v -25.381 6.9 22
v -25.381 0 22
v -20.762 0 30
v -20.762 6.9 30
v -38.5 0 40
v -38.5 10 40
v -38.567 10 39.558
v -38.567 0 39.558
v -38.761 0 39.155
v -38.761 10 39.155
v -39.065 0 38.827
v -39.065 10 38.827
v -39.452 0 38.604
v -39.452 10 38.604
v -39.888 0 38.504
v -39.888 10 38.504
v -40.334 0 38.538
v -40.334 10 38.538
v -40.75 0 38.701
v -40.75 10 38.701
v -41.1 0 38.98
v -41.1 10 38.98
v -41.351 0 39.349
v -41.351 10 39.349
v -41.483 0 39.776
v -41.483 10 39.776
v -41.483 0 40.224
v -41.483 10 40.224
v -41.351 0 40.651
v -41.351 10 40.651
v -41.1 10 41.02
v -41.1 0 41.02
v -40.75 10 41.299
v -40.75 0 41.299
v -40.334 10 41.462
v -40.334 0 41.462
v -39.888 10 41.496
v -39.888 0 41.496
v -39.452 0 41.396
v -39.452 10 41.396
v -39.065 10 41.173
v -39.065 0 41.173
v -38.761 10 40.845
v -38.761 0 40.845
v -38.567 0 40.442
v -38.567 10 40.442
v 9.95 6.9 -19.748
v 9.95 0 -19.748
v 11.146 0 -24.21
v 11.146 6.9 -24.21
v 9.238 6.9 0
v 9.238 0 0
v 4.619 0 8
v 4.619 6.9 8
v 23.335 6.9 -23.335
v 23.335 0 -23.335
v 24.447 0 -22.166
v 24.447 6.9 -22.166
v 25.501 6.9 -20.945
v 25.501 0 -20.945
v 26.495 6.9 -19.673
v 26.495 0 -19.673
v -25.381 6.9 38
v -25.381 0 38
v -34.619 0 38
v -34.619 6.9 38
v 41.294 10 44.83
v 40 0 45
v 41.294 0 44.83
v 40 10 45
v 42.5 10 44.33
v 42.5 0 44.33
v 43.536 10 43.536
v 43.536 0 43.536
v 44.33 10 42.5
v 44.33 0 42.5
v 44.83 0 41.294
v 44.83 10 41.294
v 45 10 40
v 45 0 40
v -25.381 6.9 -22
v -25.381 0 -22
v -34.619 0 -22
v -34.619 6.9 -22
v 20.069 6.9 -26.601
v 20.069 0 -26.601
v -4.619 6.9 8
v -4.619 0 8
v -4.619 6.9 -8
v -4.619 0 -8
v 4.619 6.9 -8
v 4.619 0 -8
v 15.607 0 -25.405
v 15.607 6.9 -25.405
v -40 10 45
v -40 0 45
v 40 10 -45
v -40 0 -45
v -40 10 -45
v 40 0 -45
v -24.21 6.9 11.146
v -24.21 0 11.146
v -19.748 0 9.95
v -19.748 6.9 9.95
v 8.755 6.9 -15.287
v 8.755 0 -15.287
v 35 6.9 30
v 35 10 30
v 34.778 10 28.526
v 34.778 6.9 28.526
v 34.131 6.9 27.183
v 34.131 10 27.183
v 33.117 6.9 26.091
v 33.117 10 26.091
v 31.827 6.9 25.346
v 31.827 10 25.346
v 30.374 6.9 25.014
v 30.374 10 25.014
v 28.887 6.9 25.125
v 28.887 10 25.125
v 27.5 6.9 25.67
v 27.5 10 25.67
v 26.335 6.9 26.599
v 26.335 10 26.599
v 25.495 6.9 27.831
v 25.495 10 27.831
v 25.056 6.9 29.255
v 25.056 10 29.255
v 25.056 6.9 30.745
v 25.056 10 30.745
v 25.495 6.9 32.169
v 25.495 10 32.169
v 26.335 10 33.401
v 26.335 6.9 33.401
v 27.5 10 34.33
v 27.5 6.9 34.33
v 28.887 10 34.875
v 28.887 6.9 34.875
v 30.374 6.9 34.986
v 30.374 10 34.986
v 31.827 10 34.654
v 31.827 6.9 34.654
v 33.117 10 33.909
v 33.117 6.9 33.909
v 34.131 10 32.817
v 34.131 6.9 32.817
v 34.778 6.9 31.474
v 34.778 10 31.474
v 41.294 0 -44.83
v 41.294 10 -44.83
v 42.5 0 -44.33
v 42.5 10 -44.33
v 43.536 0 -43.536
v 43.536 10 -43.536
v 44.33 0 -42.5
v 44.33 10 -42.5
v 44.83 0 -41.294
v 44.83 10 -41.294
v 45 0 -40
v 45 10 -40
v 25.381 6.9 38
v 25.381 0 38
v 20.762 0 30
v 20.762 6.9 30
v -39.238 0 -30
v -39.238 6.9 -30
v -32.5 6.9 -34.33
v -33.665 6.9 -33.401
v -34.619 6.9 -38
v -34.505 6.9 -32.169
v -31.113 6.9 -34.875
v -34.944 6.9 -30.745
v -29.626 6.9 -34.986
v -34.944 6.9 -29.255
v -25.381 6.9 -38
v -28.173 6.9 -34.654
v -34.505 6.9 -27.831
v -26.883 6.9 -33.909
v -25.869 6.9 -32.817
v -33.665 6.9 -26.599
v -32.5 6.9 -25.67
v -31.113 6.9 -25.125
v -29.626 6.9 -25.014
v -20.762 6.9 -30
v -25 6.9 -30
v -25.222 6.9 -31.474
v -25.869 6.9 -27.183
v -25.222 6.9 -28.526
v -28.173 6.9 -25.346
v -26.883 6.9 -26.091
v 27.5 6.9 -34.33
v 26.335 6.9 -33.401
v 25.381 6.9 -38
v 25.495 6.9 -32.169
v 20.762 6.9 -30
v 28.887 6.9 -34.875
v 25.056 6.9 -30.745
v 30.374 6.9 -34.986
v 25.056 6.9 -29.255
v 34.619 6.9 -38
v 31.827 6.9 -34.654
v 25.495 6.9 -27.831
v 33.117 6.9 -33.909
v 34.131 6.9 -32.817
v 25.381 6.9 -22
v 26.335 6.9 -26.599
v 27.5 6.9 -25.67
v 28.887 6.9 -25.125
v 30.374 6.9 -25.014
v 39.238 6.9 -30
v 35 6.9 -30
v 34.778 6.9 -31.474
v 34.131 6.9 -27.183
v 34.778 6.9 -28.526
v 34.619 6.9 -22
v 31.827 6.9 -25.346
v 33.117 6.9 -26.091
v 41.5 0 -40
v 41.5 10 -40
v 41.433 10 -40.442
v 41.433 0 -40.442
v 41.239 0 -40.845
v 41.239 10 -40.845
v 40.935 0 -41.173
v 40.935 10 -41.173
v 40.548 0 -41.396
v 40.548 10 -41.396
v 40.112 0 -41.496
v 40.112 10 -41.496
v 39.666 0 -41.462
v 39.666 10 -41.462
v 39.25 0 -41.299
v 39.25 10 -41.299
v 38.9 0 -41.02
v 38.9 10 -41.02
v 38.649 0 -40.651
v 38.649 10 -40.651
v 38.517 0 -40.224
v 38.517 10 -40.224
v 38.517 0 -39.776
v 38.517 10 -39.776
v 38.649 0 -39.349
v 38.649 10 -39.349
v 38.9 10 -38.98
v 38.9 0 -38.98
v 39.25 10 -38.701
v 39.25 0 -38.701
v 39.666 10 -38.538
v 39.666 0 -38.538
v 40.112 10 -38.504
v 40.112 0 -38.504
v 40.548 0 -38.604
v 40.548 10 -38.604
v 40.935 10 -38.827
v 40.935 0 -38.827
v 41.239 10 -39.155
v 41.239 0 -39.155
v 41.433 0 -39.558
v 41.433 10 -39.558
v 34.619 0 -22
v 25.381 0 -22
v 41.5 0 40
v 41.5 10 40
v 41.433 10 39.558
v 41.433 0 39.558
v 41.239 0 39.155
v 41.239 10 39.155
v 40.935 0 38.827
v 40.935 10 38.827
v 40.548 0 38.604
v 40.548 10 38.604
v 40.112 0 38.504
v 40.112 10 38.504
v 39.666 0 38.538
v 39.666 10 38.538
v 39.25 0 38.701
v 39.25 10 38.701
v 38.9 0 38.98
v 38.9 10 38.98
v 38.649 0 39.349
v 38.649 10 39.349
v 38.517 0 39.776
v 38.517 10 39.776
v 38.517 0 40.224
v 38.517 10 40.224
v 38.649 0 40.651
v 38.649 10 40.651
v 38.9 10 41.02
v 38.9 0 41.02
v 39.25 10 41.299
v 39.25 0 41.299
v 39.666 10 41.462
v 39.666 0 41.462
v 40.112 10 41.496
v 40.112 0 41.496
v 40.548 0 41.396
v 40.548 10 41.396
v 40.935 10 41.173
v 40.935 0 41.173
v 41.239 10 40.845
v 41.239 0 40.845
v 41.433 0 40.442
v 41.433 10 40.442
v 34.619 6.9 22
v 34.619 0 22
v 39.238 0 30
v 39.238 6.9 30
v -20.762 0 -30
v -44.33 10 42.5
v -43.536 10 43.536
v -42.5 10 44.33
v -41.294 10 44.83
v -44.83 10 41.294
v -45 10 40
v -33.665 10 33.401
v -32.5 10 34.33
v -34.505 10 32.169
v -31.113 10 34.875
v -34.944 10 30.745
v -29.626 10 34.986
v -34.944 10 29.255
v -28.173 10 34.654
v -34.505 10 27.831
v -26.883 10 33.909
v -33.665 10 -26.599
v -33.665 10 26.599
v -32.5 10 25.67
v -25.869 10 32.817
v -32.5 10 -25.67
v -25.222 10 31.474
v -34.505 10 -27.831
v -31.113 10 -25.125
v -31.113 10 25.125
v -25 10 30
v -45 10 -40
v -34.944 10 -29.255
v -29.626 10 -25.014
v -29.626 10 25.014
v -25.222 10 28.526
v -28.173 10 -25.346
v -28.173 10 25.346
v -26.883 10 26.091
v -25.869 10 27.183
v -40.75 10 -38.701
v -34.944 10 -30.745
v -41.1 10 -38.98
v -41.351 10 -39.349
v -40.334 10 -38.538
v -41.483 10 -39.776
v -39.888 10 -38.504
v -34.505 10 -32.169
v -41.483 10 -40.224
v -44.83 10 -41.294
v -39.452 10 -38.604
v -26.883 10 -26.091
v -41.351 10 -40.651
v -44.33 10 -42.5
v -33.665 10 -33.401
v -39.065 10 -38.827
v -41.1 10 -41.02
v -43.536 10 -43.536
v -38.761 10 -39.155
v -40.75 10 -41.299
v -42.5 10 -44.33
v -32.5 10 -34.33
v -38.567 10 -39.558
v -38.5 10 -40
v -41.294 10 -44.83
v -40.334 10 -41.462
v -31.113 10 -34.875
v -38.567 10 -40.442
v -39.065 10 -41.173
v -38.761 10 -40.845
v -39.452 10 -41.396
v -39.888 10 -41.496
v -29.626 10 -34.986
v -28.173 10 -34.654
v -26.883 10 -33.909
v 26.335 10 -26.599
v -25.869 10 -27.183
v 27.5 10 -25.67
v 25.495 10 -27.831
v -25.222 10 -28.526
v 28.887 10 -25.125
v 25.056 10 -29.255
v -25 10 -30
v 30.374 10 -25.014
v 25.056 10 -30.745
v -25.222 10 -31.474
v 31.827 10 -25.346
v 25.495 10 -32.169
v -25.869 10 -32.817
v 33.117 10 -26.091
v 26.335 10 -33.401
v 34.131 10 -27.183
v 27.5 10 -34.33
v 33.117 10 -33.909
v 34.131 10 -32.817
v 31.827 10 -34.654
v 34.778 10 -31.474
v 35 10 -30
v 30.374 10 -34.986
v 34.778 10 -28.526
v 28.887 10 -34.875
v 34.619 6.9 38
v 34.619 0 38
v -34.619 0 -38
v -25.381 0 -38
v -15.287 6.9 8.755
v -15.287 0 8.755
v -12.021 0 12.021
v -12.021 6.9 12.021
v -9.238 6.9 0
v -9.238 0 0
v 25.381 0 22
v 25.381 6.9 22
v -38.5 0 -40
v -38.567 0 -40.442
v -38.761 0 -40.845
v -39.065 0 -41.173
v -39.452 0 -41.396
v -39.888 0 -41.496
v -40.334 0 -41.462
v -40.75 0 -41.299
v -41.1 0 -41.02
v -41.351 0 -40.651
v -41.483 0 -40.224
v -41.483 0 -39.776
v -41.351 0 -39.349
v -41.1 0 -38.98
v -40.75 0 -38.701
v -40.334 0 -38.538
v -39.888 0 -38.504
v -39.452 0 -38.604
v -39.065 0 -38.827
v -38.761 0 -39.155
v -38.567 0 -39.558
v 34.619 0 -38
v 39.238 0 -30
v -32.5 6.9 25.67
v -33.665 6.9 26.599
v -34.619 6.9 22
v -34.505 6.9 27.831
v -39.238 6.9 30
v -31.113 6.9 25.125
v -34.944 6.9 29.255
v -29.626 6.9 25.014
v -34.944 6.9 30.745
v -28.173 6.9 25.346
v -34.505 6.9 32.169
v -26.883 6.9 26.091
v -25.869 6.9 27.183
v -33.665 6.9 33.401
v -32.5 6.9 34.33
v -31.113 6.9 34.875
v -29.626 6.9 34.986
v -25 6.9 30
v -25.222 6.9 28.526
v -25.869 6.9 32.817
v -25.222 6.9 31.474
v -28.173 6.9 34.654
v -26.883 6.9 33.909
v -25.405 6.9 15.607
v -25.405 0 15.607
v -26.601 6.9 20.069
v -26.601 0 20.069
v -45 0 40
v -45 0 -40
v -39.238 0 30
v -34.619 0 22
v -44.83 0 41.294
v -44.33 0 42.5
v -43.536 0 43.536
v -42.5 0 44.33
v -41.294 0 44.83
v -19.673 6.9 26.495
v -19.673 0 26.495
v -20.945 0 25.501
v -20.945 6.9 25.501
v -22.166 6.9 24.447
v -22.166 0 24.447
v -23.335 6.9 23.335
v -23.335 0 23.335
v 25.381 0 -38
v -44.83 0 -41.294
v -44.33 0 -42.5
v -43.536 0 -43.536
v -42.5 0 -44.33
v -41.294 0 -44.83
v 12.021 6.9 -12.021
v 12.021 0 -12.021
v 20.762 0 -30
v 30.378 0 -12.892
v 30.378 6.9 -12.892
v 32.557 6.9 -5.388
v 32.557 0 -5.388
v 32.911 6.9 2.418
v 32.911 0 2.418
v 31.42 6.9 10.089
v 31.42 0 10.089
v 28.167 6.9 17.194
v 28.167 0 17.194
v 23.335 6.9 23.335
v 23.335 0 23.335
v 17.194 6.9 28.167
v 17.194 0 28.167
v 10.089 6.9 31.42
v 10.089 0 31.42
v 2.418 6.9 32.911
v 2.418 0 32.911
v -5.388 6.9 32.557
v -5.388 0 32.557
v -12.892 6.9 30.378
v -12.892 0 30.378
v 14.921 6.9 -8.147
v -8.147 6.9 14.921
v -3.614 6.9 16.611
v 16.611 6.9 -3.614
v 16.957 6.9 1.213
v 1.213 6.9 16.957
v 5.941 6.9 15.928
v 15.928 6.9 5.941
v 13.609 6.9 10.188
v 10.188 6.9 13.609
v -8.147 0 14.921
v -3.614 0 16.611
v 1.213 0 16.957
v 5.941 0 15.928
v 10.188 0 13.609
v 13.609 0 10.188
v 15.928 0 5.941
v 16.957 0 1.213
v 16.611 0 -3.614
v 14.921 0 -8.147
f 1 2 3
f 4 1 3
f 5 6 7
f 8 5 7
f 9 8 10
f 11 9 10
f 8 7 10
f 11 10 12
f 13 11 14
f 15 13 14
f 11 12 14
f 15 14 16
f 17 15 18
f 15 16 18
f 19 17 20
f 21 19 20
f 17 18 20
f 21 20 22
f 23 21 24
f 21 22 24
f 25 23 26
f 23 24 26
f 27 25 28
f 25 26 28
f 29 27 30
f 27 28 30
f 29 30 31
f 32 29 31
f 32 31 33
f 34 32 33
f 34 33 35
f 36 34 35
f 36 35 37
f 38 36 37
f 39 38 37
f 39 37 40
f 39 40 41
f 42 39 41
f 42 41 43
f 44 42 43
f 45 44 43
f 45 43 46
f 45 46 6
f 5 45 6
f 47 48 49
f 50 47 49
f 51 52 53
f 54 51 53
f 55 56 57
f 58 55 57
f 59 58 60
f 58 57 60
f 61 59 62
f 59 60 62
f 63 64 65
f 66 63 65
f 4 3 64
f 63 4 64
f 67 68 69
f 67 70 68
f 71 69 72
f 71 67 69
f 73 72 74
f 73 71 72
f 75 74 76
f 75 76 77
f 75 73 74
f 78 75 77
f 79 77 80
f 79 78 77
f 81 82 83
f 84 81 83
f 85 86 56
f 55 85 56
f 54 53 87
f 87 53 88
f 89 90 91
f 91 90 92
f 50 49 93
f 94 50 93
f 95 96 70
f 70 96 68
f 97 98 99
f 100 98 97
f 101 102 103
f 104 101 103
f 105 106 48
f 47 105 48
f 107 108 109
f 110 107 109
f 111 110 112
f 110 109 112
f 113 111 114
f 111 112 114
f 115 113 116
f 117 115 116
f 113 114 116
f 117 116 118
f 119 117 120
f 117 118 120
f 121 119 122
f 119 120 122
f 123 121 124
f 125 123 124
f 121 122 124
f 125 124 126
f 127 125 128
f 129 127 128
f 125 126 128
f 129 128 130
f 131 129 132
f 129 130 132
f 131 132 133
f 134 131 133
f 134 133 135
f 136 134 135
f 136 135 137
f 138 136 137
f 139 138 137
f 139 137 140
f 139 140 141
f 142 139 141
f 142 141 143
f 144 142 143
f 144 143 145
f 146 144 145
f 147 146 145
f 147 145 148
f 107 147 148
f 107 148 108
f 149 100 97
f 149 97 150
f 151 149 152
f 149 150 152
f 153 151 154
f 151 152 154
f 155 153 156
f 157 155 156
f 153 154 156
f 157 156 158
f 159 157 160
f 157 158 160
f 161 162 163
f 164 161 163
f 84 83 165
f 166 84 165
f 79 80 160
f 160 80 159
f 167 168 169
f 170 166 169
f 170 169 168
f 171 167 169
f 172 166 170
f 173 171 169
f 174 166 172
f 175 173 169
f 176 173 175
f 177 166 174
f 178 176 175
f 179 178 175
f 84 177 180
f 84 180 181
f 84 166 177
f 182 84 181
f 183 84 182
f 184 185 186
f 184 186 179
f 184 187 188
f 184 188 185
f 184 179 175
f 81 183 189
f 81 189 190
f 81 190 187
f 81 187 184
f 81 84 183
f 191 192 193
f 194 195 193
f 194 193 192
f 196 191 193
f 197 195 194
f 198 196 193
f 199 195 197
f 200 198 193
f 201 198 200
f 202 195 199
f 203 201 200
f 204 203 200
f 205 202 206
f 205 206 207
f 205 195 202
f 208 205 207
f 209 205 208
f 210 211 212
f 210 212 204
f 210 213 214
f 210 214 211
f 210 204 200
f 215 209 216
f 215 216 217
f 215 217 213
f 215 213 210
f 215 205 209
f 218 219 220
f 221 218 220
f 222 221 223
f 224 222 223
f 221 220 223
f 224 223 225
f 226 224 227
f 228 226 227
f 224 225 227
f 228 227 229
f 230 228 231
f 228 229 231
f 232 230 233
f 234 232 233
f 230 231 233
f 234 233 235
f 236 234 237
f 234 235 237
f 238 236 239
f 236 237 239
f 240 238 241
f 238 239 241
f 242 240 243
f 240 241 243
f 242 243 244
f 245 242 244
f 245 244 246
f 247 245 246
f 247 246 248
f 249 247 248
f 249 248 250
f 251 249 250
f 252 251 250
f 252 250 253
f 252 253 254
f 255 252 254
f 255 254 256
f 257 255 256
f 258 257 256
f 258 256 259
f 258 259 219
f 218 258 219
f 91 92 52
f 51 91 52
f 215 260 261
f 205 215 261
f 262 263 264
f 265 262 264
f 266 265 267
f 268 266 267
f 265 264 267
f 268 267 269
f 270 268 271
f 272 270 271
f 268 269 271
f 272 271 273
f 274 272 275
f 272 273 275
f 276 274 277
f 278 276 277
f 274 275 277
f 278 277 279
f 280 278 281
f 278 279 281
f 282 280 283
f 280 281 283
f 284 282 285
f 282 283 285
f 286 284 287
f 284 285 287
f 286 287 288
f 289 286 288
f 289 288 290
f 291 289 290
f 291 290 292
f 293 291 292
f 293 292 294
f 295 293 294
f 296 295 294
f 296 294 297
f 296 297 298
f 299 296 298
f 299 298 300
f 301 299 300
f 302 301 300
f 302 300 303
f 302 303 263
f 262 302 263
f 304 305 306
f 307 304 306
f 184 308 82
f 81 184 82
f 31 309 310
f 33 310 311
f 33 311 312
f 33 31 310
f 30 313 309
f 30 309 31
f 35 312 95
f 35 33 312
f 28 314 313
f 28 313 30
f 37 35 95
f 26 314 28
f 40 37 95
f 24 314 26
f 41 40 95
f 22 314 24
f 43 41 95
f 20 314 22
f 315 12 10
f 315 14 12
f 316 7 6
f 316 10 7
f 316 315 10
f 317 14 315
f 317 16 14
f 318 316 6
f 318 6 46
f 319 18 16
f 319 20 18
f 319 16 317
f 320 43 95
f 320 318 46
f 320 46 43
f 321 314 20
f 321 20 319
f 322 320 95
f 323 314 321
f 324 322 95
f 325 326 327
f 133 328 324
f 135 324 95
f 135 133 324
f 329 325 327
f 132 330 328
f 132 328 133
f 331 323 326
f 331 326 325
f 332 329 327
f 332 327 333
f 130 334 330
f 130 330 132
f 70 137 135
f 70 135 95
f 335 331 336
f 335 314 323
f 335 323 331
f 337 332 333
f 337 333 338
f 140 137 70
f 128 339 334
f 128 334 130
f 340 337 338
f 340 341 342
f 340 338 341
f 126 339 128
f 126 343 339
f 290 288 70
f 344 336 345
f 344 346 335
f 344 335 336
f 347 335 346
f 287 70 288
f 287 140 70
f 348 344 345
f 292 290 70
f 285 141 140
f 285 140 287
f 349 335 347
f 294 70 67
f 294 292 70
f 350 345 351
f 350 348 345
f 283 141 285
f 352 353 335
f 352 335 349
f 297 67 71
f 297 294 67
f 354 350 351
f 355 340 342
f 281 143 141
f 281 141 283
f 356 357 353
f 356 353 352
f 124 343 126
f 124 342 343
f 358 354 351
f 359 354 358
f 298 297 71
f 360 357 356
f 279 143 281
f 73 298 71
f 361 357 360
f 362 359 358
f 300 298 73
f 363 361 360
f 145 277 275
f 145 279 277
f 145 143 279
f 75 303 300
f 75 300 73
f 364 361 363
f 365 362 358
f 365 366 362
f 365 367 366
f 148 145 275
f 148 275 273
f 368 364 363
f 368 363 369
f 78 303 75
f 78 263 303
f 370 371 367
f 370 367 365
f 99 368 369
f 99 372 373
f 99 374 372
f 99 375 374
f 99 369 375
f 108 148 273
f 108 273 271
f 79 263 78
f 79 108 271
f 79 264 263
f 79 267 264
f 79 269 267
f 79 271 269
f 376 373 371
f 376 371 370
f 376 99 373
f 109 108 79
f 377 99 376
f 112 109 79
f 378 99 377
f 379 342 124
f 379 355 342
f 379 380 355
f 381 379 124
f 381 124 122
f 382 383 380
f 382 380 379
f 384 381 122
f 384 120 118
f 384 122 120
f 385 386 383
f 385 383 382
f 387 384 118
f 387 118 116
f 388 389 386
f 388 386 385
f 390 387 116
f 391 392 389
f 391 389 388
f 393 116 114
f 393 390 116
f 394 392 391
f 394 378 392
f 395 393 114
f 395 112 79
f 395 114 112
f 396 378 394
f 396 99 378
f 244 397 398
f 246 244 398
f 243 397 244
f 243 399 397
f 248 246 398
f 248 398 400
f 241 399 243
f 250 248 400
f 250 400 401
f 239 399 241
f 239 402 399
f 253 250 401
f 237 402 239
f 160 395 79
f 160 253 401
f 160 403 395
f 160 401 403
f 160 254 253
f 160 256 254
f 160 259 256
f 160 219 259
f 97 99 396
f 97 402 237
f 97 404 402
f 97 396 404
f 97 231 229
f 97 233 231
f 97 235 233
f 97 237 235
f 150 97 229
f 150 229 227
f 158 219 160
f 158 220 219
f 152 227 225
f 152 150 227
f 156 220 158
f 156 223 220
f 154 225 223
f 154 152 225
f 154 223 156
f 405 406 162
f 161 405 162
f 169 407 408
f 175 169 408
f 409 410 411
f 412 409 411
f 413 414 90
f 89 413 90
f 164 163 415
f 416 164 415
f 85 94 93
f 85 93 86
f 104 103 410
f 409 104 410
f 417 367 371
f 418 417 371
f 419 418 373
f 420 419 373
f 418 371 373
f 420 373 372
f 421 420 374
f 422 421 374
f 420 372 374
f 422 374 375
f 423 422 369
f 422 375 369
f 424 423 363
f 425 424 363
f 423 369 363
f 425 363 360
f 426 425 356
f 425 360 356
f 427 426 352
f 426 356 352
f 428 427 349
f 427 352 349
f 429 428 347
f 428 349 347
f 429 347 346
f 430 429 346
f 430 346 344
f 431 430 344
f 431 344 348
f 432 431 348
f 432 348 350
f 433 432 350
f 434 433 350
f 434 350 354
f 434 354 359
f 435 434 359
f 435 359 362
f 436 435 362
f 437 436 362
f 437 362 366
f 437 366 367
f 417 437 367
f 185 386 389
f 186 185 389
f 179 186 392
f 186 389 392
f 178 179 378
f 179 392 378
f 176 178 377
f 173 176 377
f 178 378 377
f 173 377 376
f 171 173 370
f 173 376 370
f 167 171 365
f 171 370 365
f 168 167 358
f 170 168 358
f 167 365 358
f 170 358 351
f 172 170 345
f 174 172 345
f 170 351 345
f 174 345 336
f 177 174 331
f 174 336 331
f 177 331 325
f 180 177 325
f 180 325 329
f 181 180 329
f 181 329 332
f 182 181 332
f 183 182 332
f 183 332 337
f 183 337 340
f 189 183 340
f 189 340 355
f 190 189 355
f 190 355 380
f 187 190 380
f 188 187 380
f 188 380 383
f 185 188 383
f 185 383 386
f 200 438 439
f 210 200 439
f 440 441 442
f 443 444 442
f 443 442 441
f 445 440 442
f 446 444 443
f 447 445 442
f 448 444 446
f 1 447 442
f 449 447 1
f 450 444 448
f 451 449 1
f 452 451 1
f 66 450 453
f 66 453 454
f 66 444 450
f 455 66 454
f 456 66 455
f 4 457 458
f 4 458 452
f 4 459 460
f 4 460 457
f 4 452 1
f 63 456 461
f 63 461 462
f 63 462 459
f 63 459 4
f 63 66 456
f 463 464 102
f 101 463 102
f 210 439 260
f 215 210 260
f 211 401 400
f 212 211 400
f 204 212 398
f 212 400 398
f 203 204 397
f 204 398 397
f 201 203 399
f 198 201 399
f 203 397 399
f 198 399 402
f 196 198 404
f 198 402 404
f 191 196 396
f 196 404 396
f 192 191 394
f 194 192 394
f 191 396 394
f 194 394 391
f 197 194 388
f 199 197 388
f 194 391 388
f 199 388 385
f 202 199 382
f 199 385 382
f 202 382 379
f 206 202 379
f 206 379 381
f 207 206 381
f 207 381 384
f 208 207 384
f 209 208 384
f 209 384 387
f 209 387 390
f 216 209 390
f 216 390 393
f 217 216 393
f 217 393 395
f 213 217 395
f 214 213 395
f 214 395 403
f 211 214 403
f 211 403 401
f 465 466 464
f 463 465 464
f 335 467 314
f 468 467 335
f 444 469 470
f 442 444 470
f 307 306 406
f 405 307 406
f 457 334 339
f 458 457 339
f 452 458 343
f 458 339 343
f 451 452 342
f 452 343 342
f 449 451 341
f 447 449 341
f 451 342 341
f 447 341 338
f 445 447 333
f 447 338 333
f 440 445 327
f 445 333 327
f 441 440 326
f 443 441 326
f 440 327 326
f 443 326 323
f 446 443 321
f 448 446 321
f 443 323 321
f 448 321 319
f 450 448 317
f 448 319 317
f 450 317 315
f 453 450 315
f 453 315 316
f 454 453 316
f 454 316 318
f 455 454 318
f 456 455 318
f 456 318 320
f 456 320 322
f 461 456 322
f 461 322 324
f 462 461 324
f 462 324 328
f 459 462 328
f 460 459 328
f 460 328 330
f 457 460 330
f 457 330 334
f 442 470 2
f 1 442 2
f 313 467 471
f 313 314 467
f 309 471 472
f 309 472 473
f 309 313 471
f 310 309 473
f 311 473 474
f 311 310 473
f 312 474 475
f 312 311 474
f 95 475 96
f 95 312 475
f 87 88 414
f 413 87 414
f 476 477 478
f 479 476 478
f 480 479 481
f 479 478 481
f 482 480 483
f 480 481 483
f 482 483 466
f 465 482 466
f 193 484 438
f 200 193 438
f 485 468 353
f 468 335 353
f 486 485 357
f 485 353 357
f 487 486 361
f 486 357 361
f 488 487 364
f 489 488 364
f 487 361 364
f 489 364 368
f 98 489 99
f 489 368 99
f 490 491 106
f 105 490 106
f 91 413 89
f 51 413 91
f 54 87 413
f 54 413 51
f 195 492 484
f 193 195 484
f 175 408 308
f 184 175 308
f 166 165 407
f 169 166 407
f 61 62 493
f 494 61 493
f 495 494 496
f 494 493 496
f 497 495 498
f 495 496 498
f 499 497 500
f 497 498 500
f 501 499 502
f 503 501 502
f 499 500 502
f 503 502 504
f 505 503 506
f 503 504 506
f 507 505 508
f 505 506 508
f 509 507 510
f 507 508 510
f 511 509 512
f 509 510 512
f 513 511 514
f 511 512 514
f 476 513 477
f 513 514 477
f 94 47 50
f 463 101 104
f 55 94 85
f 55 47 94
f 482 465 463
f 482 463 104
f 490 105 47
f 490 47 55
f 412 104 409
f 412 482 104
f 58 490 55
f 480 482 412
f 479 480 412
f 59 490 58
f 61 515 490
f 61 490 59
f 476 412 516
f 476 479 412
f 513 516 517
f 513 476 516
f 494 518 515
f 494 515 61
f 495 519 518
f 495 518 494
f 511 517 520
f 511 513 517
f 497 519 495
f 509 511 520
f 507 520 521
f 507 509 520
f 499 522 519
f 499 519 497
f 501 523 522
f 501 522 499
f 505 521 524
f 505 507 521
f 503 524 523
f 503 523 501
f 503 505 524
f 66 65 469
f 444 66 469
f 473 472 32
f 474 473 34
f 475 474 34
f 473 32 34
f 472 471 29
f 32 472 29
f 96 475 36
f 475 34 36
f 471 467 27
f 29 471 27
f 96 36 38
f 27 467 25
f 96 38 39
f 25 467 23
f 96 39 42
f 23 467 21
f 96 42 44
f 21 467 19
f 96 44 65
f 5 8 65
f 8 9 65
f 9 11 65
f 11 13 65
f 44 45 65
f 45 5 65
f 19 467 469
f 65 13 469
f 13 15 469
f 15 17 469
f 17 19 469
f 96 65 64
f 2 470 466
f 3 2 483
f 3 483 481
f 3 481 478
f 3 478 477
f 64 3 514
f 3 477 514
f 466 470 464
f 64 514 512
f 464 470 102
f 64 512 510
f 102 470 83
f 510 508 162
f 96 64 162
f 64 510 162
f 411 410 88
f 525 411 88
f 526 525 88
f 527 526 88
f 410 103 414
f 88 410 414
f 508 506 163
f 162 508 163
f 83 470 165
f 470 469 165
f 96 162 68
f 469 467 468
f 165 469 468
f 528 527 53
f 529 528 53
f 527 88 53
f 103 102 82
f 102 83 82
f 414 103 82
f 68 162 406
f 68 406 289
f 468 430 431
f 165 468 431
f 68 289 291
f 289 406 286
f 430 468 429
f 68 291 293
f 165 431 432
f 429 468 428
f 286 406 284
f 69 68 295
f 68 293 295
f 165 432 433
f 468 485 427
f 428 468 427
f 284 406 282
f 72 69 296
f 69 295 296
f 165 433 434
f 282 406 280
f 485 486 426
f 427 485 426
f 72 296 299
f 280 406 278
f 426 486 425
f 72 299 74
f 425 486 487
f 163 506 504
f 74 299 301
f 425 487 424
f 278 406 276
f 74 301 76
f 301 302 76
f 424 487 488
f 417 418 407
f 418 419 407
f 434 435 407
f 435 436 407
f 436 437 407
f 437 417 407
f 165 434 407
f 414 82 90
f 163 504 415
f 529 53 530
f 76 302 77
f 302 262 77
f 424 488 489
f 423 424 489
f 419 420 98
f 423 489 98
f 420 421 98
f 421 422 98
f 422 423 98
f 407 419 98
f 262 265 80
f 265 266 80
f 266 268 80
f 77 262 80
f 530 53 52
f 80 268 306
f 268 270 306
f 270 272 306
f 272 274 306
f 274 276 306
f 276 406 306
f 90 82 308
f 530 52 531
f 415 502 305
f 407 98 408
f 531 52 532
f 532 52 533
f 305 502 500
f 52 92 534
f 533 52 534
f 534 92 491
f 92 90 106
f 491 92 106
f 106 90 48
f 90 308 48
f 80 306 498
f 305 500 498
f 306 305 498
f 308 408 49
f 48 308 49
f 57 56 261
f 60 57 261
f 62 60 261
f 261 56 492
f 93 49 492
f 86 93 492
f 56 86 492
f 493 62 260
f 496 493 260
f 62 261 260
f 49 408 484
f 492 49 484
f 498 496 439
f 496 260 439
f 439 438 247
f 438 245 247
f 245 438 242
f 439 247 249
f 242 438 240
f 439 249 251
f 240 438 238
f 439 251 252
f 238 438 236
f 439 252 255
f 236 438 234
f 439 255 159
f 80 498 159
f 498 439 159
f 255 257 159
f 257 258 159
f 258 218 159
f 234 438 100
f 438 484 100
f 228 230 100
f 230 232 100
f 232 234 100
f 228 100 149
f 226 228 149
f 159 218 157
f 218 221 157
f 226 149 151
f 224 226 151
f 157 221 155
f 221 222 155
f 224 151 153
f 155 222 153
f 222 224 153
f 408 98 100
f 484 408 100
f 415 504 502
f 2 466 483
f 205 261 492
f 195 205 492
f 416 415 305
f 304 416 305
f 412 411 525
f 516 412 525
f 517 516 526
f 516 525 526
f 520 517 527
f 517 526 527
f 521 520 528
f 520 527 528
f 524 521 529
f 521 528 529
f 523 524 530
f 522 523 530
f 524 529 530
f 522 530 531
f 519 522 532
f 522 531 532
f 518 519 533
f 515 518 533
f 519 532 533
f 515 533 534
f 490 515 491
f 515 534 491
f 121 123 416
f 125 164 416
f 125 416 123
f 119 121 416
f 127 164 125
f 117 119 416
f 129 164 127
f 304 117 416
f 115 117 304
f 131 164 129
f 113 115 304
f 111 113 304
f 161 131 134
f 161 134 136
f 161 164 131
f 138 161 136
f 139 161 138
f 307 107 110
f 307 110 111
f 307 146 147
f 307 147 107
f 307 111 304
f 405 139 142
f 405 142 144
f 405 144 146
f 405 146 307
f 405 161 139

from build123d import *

# Parameters (mm, degrees)
SKETCH1_W           = 90
SKETCH1_H           = 90
BOSS_EXTRUDE1_DEPTH = 10
CUT_EXTRUDE1_DEPTH  = 6.9
SKETCH3_R           = 1.5
CUT_EXTRUDE2_DEPTH  = 11
SKETCH4_R           = 5
CUT_EXTRUDE3_DEPTH  = 11
CUT_EXTRUDE4_DEPTH  = 6.9
FILLET1_R           = 5


with BuildPart() as part:
    # Sketch1 → Boss-Extrude1 (new body)
    with BuildSketch(Plane(origin=(0, 0, 0), x_dir=(1, 0, 0), z_dir=(0, 1, 0))):
        Rectangle(SKETCH1_W, SKETCH1_H)
    extrude(amount=BOSS_EXTRUDE1_DEPTH)

    # Sketch2 → Cut-Extrude1 (cut)
    with BuildSketch(Plane.XZ):
        Polygon((-4.618802154, -8), (4.618802154, -8), (9.237604307, 0), (4.618802154, 8), (-4.618802154, 8), (-9.237604307, 0), align=None)
        with BuildLine():
            Line((-8.754828956, 15.286801604), (-12.02081528, 12.02081528))
            ThreePointArc((-12.02081528, 12.02081528), (12.02081528, 12.02081528), (12.02081528, -12.02081528))
            Line((12.02081528, -12.02081528), (15.286801604, -8.754828956))
            Line((15.286801604, -8.754828956), (24.209642177, -11.145696882))
            Line((24.209642177, -11.145696882), (26.494591989, -19.673245674))
            ThreePointArc((26.494591989, -19.673245674), (23.334523779, 23.334523779), (-19.673245674, 26.494591989))
            Line((-19.673245674, 26.494591989), (-11.145696882, 24.209642177))
            Line((-11.145696882, 24.209642177), (-8.754828956, 15.286801604))
        make_face()
        with BuildLine():
            Line((15.286801604, -8.754828956), (12.02081528, -12.02081528))
            ThreePointArc((12.02081528, -12.02081528), (9.950262871, -15.607117349), (9.950263016, -19.74822225))
            ThreePointArc((9.950263016, -19.74822225), (12.020815311, -23.33452381), (15.607116893, -25.405076066))
            ThreePointArc((15.607116893, -25.405076066), (19.748221753, -25.405076177), (23.334523779, -23.334523779))
            ThreePointArc((23.334523779, -23.334523779), (24.981721996, -21.561854422), (26.494591989, -19.673245674))
            Line((26.494591989, -19.673245674), (24.209642177, -11.145696882))
            Line((24.209642177, -11.145696882), (15.286801604, -8.754828956))
        make_face()
        with BuildLine():
            ThreePointArc((-19.748221967, 9.95026294), (-15.607117207, 9.950262909), (-12.02081528, 12.02081528))
            Line((-12.02081528, 12.02081528), (-8.754828956, 15.286801604))
            Line((-8.754828956, 15.286801604), (-11.145696882, 24.209642177))
            Line((-11.145696882, 24.209642177), (-19.673245674, 26.494591989))
            ThreePointArc((-19.673245674, 26.494591989), (-21.561854422, 24.981721996), (-23.334523779, 23.334523779))
            ThreePointArc((-23.334523779, 23.334523779), (-25.405076135, 19.748221911), (-25.405076151, 15.607117209))
            ThreePointArc((-25.405076151, 15.607117209), (-23.334523822, 12.020815323), (-19.748221967, 9.95026294))
        make_face()
        with BuildLine():
            Line((-26.600510103, 20.068537455), (-25.405076151, 15.607117209))
            ThreePointArc((-25.405076151, 15.607117209), (-25.405076135, 19.748221911), (-23.334523779, 23.334523779))
            Line((-23.334523779, 23.334523779), (-26.600510103, 20.068537455))
        make_face()
        with BuildLine():
            Line((-19.748221967, 9.95026294), (-15.286801604, 8.754828956))
            Line((-15.286801604, 8.754828956), (-12.02081528, 12.02081528))
            ThreePointArc((-12.02081528, 12.02081528), (-15.607117207, 9.950262909), (-19.748221967, 9.95026294))
        make_face()
        with BuildLine():
            Line((-24.209642177, 11.145696882), (-19.748221967, 9.95026294))
            ThreePointArc((-19.748221967, 9.95026294), (-23.334523822, 12.020815323), (-25.405076151, 15.607117209))
            Line((-25.405076151, 15.607117209), (-24.209642177, 11.145696882))
        make_face()
        with BuildLine():
            ThreePointArc((9.950263016, -19.74822225), (9.950262871, -15.607117349), (12.02081528, -12.02081528))
            Line((12.02081528, -12.02081528), (8.754828956, -15.286801604))
            Line((8.754828956, -15.286801604), (9.950263016, -19.74822225))
        make_face()
        with BuildLine():
            ThreePointArc((15.607116893, -25.405076066), (12.020815311, -23.33452381), (9.950263016, -19.74822225))
            Line((9.950263016, -19.74822225), (11.145696882, -24.209642177))
            Line((11.145696882, -24.209642177), (15.607116893, -25.405076066))
        make_face()
        with BuildLine():
            ThreePointArc((23.334523779, -23.334523779), (19.748221753, -25.405076177), (15.607116893, -25.405076066))
            Line((15.607116893, -25.405076066), (20.068537455, -26.600510103))
            Line((20.068537455, -26.600510103), (23.334523779, -23.334523779))
        make_face()
    extrude(amount=-CUT_EXTRUDE1_DEPTH, mode=Mode.SUBTRACT)

    # Sketch3 → Cut-Extrude2 (cut, through all)
    with BuildSketch(Plane(origin=(0, 10, 0), x_dir=(1, 0, 0), z_dir=(0, 1, 0))):
        with Locations((-40, 40)):
            Circle(SKETCH3_R)
        with Locations((40, 40)):
            Circle(SKETCH3_R)
        with Locations((40, -40)):
            Circle(SKETCH3_R)
        with Locations((-40, -40)):
            Circle(SKETCH3_R)
    extrude(amount=-CUT_EXTRUDE2_DEPTH, mode=Mode.SUBTRACT)

    # Sketch4 → Cut-Extrude3 (cut, through all)
    with BuildSketch(Plane(origin=(0, 10, 0), x_dir=(1, 0, 0), z_dir=(0, 1, 0))):
        with Locations((-30, 30)):
            Circle(SKETCH4_R)
        with Locations((30, 30)):
            Circle(SKETCH4_R)
        with Locations((30, -30)):
            Circle(SKETCH4_R)
        with Locations((-30, -30)):
            Circle(SKETCH4_R)
    extrude(amount=-CUT_EXTRUDE3_DEPTH, mode=Mode.SUBTRACT)

    # Sketch6 → Cut-Extrude4 (cut)
    with BuildSketch(Plane.XZ):
        Polygon((-25.381197846, 22), (-20.762395693, 30), (-25.381197846, 38), (-34.618802154, 38), (-39.237604307, 30), (-34.618802154, 22), align=None)
        Polygon((34.618802154, 22), (39.237604307, 30), (34.618802154, 38), (25.381197846, 38), (20.762395693, 30), (25.381197846, 22), align=None)
        Polygon((34.618802154, -38), (39.237604307, -30), (34.618802154, -22), (25.381197846, -22), (20.762395693, -30), (25.381197846, -38), align=None)
        Polygon((-20.762395693, -30), (-25.381197846, -22), (-34.618802154, -22), (-39.237604307, -30), (-34.618802154, -38), (-25.381197846, -38), align=None)
    extrude(amount=-CUT_EXTRUDE4_DEPTH, mode=Mode.SUBTRACT)

    # Fillet1
    fillet1_edges = [part.edges().sort_by_distance(p)[0] for p in [
        (45, 5, 45),
        (-45, 5, 45),
        (-45, 5, -45),
        (45, 5, -45),
    ]]
    fillet(fillet1_edges, radius=FILLET1_R)


solid = part.part
